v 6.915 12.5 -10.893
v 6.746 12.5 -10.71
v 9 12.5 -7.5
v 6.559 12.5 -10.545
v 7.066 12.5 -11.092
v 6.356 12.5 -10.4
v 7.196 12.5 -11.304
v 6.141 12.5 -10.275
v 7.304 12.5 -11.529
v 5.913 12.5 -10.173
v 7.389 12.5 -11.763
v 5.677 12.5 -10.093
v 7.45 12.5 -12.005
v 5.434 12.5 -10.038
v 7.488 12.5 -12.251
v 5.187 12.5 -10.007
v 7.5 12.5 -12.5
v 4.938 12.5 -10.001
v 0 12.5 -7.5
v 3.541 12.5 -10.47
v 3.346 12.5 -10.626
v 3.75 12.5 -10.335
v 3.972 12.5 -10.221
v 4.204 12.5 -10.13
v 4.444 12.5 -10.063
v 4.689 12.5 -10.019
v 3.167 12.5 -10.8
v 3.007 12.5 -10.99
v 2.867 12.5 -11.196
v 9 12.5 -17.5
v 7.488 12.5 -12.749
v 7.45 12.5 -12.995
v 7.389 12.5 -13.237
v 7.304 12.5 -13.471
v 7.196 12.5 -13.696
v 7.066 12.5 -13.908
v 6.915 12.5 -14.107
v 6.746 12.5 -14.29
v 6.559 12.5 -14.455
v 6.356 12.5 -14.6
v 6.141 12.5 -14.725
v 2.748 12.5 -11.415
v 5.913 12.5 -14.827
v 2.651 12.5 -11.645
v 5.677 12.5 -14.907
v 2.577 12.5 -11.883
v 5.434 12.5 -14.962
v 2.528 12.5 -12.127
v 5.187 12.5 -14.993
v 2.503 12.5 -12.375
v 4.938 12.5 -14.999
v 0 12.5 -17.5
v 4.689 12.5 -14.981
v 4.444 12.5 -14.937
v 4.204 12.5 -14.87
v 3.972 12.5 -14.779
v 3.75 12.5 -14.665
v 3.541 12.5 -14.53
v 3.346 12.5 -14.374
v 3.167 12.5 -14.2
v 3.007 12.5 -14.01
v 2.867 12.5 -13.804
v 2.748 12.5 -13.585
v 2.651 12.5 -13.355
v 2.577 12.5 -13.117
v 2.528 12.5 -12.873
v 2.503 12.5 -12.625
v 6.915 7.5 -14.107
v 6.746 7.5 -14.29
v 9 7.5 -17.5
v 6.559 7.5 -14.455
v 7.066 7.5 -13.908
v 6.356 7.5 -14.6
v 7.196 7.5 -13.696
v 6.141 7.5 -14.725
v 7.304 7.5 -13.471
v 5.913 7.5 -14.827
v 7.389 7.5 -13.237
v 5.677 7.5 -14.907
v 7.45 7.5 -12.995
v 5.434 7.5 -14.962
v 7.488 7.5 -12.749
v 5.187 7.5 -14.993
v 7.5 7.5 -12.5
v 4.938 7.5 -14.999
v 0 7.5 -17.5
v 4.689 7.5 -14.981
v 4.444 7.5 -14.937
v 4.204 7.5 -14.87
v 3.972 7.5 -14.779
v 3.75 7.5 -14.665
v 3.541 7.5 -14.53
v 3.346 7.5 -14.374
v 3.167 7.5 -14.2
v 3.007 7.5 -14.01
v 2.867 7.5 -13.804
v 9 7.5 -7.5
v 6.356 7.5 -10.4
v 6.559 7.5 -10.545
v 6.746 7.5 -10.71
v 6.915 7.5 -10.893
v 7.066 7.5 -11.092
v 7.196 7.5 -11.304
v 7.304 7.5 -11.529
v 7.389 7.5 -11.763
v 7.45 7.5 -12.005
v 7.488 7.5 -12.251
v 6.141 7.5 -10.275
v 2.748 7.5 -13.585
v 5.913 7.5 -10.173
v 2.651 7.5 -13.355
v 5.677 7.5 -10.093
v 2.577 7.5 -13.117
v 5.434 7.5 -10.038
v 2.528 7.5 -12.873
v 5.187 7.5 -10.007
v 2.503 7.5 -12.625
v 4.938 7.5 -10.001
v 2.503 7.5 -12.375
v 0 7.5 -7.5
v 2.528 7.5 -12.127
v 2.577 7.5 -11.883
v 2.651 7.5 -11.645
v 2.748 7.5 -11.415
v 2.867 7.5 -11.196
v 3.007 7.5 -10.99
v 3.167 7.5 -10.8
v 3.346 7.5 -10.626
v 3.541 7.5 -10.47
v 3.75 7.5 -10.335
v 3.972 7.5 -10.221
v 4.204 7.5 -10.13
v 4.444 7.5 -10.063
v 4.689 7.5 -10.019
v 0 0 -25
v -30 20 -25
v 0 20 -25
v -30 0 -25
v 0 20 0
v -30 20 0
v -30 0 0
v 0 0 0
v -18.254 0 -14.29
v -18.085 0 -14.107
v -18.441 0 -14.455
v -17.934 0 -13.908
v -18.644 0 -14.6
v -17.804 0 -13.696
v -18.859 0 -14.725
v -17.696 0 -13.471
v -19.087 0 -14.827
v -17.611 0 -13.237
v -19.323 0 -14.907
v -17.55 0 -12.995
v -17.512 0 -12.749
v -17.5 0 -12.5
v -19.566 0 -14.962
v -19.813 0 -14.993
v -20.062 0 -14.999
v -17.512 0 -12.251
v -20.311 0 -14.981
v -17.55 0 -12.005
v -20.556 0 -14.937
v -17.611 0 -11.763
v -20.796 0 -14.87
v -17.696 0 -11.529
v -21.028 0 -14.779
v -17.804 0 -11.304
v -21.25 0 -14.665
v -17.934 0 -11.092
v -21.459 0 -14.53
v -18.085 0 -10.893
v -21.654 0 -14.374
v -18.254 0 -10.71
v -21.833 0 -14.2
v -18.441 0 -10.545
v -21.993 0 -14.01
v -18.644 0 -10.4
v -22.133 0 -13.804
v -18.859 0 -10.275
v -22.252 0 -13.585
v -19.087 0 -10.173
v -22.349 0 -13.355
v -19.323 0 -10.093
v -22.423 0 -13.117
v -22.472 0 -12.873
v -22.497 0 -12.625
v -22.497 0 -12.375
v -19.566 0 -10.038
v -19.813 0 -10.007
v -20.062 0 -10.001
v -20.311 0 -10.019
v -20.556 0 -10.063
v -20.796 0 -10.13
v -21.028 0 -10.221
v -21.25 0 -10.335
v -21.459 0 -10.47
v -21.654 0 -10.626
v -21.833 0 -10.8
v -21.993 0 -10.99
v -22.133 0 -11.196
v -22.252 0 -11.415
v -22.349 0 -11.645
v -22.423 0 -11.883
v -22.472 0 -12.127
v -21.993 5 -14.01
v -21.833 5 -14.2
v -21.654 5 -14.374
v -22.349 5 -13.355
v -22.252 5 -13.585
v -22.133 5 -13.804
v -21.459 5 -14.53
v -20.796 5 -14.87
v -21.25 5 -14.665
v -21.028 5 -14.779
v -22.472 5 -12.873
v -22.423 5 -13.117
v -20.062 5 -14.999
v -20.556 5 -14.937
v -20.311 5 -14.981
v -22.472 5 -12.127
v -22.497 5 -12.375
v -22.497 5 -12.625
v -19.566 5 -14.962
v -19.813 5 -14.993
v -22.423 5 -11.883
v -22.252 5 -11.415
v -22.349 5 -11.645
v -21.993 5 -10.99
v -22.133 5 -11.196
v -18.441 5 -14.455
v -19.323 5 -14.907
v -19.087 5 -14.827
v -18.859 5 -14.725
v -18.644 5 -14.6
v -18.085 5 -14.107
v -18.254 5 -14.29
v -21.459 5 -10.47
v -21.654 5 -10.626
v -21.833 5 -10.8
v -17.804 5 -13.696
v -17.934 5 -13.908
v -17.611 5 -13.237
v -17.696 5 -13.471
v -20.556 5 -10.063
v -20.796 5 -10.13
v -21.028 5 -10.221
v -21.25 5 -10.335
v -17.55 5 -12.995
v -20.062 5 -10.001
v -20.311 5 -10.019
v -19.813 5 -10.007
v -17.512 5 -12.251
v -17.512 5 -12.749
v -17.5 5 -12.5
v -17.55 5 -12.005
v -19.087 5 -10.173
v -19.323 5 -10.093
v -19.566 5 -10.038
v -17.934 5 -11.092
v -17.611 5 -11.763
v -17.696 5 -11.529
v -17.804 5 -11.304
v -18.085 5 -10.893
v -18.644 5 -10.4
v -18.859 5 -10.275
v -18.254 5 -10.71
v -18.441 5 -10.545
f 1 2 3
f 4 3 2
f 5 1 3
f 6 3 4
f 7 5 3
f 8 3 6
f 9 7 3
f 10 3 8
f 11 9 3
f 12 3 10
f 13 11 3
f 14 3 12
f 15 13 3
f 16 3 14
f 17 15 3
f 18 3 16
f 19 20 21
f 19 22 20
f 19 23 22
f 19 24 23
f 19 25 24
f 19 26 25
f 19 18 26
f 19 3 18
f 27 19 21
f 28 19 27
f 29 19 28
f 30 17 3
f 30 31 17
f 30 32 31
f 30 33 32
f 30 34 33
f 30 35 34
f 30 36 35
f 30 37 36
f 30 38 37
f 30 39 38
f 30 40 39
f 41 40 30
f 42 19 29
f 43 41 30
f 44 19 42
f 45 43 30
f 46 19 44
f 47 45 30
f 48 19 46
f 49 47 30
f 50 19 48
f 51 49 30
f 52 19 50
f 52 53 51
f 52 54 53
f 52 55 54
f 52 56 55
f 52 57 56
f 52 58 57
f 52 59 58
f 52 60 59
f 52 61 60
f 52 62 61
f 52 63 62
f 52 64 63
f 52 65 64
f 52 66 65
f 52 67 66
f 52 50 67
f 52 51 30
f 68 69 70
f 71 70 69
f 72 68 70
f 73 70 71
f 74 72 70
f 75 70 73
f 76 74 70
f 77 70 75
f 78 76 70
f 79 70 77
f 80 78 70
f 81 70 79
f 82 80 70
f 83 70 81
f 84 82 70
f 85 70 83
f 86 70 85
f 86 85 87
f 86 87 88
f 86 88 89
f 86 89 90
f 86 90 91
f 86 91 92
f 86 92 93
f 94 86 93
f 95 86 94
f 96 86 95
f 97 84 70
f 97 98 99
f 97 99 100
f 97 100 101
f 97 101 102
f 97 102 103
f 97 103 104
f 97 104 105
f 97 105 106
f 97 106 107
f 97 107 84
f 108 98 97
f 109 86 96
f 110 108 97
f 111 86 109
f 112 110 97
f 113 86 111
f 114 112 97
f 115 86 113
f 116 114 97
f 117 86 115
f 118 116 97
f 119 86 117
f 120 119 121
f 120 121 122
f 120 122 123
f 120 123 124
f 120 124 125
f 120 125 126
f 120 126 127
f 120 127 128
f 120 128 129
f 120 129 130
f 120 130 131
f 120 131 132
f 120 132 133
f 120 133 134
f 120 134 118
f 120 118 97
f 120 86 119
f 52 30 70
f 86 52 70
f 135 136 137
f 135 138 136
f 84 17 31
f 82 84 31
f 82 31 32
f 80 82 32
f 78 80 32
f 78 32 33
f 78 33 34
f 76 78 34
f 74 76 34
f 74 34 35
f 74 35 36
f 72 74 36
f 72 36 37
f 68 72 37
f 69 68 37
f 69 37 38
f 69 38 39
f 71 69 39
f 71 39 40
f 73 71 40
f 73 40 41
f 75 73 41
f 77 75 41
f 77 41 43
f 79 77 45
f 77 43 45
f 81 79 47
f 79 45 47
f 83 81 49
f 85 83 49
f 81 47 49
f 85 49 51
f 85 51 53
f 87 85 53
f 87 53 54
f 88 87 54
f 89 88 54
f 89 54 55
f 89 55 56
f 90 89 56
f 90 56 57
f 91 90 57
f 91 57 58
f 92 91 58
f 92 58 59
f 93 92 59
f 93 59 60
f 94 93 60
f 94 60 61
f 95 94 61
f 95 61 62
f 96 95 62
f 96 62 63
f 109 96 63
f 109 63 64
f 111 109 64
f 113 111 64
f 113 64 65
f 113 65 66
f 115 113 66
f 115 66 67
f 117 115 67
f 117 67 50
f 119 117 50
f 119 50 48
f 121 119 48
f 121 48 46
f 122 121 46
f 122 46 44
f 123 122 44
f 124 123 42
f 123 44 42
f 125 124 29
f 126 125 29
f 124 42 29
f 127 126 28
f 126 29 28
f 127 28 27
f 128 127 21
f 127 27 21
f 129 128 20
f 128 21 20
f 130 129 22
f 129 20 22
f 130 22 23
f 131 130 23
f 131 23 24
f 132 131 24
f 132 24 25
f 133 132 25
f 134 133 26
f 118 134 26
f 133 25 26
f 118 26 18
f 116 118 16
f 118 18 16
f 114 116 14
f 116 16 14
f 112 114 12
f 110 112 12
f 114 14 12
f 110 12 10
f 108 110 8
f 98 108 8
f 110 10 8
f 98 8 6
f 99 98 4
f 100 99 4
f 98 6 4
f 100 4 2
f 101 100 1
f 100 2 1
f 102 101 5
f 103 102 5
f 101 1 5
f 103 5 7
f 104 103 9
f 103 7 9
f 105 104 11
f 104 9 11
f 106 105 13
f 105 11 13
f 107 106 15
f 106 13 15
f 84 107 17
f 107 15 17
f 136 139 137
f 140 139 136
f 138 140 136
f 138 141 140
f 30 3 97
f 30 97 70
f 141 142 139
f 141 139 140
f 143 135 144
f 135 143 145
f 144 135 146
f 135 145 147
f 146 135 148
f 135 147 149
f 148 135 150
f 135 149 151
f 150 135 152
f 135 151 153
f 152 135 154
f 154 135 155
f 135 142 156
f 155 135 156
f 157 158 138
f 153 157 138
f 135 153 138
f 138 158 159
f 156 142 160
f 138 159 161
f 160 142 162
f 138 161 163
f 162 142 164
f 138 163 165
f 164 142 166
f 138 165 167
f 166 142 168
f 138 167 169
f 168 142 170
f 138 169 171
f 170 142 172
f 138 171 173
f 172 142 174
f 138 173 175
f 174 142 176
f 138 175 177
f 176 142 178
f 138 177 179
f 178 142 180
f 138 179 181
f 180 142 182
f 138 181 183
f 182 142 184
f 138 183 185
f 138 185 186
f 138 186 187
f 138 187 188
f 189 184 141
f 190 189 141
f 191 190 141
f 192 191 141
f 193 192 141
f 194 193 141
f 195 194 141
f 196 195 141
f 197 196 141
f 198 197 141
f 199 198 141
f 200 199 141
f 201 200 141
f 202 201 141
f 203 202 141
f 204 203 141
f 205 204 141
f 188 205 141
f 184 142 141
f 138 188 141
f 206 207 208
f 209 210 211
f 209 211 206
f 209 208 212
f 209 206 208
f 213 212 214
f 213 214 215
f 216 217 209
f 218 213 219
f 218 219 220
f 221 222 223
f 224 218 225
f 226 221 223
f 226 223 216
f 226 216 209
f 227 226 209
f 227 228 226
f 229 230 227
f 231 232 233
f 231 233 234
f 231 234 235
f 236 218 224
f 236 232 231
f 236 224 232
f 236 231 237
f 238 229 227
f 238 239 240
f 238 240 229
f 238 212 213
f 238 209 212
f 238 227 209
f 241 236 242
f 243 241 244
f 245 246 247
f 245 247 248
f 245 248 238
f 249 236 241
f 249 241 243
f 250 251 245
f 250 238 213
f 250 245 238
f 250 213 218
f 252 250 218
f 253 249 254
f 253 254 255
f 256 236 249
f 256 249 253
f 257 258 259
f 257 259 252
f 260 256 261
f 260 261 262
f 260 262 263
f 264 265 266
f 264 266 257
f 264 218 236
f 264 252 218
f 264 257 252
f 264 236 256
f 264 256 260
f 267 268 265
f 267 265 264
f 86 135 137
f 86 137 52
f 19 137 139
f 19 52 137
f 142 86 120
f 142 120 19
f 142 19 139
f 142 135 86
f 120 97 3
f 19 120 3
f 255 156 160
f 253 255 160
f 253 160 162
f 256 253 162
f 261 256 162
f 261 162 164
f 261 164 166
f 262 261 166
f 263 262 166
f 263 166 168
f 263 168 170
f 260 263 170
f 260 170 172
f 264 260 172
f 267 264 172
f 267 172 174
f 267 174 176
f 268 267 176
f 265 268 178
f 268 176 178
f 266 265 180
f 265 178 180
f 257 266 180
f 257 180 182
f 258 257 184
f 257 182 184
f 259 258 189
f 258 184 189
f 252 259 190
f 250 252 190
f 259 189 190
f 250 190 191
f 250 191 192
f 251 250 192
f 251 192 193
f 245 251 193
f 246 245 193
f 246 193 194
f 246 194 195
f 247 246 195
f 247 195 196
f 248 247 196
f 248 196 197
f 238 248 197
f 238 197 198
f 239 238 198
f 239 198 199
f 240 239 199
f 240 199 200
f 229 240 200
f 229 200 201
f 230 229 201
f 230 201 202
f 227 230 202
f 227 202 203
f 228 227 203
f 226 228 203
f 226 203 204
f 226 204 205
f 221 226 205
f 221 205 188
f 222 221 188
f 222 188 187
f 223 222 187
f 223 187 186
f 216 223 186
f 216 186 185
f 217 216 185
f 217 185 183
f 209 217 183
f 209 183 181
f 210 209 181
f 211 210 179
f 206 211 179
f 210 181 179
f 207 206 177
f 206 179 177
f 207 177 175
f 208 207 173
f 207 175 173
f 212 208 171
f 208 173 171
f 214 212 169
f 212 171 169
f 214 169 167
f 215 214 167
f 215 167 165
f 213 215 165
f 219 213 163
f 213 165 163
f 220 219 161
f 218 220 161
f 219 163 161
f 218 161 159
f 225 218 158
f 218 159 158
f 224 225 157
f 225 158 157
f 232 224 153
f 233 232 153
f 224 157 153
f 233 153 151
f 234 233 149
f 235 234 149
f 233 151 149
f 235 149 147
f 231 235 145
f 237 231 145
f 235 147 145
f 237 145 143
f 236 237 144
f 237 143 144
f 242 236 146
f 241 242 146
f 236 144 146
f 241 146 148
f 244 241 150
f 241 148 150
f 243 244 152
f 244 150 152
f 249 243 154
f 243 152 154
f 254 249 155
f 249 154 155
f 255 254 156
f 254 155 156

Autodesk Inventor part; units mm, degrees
ref_plane "YZ Plane" through (0, 0, 0) normal (1, 0, 0) x (0, 1, 0)
ref_plane "XZ Plane" through (0, 0, 0) normal (0, 1, 0) x (-1, 0, 0)
ref_plane "XY Plane" through (0, 0, 0) normal (0, 0, 1) x (1, 0, 0)
sketch "Sketch1" plane through (0, 0, 0) normal (0, 1, 0) x (-1, 0, 0)
  line L0 (0, 0) -> (30, 0)
  line L1 (30, 0) -> (30, -25)
  line L2 (30, -25) -> (0, -25)
  line L3 (0, -25) -> (0, 0)
  dimension "d0" = 30
  dimension "d1" = 25
extrude "Extrusion1" add sketch "Sketch1" along normal blind 20
sketch "Sketch2" plane through (0, 0, 0) normal (0, -1, 0) x (1, 0, 0)
  circle A0 centre (-20, -12.5) radius 2.5
  line L0 (0, 0) -> (0, -25) projected
  point P0 (0, -12.5)
  dimension "d4" = 5
  dimension "d15" = 20
extrude "Extrusion2" cut sketch "Sketch2" against normal blind 5
sketch "Sketch3" plane through (0, 0, 0) normal (1, 0, 0) x (0, 0, -1)
  line L0 (17.5, 7.5) -> (7.5, 7.5)
  line L1 (7.5, 7.5) -> (7.5, 12.5)
  line L2 (7.5, 12.5) -> (17.5, 12.5)
  line L3 (17.5, 12.5) -> (17.5, 7.5)
  line L4 (17.5, 7.5) -> (7.5, 12.5) construction
  line L5 (7.5, 7.5) -> (17.5, 12.5) construction
  point P0 (0, 0)
  point P1 (12.5, 10)
  dimension "d7" = 10
  dimension "d8" = 5
extrude "Extrusion3" add sketch "Sketch3" along normal blind 9
sketch "Sketch4" plane through (0, 12.5, -7.5) normal (0, 1, 0) x (1, 0, 0)
  circle A0 centre (5, 5) radius 2.5
  line L0 (0, -7.5) -> (0, 17.5) projected
  dimension "d11" = 5
  dimension "d14" = 5
extrude "Extrusion4" cut sketch "Sketch4" against normal through all
properties part number "head"
